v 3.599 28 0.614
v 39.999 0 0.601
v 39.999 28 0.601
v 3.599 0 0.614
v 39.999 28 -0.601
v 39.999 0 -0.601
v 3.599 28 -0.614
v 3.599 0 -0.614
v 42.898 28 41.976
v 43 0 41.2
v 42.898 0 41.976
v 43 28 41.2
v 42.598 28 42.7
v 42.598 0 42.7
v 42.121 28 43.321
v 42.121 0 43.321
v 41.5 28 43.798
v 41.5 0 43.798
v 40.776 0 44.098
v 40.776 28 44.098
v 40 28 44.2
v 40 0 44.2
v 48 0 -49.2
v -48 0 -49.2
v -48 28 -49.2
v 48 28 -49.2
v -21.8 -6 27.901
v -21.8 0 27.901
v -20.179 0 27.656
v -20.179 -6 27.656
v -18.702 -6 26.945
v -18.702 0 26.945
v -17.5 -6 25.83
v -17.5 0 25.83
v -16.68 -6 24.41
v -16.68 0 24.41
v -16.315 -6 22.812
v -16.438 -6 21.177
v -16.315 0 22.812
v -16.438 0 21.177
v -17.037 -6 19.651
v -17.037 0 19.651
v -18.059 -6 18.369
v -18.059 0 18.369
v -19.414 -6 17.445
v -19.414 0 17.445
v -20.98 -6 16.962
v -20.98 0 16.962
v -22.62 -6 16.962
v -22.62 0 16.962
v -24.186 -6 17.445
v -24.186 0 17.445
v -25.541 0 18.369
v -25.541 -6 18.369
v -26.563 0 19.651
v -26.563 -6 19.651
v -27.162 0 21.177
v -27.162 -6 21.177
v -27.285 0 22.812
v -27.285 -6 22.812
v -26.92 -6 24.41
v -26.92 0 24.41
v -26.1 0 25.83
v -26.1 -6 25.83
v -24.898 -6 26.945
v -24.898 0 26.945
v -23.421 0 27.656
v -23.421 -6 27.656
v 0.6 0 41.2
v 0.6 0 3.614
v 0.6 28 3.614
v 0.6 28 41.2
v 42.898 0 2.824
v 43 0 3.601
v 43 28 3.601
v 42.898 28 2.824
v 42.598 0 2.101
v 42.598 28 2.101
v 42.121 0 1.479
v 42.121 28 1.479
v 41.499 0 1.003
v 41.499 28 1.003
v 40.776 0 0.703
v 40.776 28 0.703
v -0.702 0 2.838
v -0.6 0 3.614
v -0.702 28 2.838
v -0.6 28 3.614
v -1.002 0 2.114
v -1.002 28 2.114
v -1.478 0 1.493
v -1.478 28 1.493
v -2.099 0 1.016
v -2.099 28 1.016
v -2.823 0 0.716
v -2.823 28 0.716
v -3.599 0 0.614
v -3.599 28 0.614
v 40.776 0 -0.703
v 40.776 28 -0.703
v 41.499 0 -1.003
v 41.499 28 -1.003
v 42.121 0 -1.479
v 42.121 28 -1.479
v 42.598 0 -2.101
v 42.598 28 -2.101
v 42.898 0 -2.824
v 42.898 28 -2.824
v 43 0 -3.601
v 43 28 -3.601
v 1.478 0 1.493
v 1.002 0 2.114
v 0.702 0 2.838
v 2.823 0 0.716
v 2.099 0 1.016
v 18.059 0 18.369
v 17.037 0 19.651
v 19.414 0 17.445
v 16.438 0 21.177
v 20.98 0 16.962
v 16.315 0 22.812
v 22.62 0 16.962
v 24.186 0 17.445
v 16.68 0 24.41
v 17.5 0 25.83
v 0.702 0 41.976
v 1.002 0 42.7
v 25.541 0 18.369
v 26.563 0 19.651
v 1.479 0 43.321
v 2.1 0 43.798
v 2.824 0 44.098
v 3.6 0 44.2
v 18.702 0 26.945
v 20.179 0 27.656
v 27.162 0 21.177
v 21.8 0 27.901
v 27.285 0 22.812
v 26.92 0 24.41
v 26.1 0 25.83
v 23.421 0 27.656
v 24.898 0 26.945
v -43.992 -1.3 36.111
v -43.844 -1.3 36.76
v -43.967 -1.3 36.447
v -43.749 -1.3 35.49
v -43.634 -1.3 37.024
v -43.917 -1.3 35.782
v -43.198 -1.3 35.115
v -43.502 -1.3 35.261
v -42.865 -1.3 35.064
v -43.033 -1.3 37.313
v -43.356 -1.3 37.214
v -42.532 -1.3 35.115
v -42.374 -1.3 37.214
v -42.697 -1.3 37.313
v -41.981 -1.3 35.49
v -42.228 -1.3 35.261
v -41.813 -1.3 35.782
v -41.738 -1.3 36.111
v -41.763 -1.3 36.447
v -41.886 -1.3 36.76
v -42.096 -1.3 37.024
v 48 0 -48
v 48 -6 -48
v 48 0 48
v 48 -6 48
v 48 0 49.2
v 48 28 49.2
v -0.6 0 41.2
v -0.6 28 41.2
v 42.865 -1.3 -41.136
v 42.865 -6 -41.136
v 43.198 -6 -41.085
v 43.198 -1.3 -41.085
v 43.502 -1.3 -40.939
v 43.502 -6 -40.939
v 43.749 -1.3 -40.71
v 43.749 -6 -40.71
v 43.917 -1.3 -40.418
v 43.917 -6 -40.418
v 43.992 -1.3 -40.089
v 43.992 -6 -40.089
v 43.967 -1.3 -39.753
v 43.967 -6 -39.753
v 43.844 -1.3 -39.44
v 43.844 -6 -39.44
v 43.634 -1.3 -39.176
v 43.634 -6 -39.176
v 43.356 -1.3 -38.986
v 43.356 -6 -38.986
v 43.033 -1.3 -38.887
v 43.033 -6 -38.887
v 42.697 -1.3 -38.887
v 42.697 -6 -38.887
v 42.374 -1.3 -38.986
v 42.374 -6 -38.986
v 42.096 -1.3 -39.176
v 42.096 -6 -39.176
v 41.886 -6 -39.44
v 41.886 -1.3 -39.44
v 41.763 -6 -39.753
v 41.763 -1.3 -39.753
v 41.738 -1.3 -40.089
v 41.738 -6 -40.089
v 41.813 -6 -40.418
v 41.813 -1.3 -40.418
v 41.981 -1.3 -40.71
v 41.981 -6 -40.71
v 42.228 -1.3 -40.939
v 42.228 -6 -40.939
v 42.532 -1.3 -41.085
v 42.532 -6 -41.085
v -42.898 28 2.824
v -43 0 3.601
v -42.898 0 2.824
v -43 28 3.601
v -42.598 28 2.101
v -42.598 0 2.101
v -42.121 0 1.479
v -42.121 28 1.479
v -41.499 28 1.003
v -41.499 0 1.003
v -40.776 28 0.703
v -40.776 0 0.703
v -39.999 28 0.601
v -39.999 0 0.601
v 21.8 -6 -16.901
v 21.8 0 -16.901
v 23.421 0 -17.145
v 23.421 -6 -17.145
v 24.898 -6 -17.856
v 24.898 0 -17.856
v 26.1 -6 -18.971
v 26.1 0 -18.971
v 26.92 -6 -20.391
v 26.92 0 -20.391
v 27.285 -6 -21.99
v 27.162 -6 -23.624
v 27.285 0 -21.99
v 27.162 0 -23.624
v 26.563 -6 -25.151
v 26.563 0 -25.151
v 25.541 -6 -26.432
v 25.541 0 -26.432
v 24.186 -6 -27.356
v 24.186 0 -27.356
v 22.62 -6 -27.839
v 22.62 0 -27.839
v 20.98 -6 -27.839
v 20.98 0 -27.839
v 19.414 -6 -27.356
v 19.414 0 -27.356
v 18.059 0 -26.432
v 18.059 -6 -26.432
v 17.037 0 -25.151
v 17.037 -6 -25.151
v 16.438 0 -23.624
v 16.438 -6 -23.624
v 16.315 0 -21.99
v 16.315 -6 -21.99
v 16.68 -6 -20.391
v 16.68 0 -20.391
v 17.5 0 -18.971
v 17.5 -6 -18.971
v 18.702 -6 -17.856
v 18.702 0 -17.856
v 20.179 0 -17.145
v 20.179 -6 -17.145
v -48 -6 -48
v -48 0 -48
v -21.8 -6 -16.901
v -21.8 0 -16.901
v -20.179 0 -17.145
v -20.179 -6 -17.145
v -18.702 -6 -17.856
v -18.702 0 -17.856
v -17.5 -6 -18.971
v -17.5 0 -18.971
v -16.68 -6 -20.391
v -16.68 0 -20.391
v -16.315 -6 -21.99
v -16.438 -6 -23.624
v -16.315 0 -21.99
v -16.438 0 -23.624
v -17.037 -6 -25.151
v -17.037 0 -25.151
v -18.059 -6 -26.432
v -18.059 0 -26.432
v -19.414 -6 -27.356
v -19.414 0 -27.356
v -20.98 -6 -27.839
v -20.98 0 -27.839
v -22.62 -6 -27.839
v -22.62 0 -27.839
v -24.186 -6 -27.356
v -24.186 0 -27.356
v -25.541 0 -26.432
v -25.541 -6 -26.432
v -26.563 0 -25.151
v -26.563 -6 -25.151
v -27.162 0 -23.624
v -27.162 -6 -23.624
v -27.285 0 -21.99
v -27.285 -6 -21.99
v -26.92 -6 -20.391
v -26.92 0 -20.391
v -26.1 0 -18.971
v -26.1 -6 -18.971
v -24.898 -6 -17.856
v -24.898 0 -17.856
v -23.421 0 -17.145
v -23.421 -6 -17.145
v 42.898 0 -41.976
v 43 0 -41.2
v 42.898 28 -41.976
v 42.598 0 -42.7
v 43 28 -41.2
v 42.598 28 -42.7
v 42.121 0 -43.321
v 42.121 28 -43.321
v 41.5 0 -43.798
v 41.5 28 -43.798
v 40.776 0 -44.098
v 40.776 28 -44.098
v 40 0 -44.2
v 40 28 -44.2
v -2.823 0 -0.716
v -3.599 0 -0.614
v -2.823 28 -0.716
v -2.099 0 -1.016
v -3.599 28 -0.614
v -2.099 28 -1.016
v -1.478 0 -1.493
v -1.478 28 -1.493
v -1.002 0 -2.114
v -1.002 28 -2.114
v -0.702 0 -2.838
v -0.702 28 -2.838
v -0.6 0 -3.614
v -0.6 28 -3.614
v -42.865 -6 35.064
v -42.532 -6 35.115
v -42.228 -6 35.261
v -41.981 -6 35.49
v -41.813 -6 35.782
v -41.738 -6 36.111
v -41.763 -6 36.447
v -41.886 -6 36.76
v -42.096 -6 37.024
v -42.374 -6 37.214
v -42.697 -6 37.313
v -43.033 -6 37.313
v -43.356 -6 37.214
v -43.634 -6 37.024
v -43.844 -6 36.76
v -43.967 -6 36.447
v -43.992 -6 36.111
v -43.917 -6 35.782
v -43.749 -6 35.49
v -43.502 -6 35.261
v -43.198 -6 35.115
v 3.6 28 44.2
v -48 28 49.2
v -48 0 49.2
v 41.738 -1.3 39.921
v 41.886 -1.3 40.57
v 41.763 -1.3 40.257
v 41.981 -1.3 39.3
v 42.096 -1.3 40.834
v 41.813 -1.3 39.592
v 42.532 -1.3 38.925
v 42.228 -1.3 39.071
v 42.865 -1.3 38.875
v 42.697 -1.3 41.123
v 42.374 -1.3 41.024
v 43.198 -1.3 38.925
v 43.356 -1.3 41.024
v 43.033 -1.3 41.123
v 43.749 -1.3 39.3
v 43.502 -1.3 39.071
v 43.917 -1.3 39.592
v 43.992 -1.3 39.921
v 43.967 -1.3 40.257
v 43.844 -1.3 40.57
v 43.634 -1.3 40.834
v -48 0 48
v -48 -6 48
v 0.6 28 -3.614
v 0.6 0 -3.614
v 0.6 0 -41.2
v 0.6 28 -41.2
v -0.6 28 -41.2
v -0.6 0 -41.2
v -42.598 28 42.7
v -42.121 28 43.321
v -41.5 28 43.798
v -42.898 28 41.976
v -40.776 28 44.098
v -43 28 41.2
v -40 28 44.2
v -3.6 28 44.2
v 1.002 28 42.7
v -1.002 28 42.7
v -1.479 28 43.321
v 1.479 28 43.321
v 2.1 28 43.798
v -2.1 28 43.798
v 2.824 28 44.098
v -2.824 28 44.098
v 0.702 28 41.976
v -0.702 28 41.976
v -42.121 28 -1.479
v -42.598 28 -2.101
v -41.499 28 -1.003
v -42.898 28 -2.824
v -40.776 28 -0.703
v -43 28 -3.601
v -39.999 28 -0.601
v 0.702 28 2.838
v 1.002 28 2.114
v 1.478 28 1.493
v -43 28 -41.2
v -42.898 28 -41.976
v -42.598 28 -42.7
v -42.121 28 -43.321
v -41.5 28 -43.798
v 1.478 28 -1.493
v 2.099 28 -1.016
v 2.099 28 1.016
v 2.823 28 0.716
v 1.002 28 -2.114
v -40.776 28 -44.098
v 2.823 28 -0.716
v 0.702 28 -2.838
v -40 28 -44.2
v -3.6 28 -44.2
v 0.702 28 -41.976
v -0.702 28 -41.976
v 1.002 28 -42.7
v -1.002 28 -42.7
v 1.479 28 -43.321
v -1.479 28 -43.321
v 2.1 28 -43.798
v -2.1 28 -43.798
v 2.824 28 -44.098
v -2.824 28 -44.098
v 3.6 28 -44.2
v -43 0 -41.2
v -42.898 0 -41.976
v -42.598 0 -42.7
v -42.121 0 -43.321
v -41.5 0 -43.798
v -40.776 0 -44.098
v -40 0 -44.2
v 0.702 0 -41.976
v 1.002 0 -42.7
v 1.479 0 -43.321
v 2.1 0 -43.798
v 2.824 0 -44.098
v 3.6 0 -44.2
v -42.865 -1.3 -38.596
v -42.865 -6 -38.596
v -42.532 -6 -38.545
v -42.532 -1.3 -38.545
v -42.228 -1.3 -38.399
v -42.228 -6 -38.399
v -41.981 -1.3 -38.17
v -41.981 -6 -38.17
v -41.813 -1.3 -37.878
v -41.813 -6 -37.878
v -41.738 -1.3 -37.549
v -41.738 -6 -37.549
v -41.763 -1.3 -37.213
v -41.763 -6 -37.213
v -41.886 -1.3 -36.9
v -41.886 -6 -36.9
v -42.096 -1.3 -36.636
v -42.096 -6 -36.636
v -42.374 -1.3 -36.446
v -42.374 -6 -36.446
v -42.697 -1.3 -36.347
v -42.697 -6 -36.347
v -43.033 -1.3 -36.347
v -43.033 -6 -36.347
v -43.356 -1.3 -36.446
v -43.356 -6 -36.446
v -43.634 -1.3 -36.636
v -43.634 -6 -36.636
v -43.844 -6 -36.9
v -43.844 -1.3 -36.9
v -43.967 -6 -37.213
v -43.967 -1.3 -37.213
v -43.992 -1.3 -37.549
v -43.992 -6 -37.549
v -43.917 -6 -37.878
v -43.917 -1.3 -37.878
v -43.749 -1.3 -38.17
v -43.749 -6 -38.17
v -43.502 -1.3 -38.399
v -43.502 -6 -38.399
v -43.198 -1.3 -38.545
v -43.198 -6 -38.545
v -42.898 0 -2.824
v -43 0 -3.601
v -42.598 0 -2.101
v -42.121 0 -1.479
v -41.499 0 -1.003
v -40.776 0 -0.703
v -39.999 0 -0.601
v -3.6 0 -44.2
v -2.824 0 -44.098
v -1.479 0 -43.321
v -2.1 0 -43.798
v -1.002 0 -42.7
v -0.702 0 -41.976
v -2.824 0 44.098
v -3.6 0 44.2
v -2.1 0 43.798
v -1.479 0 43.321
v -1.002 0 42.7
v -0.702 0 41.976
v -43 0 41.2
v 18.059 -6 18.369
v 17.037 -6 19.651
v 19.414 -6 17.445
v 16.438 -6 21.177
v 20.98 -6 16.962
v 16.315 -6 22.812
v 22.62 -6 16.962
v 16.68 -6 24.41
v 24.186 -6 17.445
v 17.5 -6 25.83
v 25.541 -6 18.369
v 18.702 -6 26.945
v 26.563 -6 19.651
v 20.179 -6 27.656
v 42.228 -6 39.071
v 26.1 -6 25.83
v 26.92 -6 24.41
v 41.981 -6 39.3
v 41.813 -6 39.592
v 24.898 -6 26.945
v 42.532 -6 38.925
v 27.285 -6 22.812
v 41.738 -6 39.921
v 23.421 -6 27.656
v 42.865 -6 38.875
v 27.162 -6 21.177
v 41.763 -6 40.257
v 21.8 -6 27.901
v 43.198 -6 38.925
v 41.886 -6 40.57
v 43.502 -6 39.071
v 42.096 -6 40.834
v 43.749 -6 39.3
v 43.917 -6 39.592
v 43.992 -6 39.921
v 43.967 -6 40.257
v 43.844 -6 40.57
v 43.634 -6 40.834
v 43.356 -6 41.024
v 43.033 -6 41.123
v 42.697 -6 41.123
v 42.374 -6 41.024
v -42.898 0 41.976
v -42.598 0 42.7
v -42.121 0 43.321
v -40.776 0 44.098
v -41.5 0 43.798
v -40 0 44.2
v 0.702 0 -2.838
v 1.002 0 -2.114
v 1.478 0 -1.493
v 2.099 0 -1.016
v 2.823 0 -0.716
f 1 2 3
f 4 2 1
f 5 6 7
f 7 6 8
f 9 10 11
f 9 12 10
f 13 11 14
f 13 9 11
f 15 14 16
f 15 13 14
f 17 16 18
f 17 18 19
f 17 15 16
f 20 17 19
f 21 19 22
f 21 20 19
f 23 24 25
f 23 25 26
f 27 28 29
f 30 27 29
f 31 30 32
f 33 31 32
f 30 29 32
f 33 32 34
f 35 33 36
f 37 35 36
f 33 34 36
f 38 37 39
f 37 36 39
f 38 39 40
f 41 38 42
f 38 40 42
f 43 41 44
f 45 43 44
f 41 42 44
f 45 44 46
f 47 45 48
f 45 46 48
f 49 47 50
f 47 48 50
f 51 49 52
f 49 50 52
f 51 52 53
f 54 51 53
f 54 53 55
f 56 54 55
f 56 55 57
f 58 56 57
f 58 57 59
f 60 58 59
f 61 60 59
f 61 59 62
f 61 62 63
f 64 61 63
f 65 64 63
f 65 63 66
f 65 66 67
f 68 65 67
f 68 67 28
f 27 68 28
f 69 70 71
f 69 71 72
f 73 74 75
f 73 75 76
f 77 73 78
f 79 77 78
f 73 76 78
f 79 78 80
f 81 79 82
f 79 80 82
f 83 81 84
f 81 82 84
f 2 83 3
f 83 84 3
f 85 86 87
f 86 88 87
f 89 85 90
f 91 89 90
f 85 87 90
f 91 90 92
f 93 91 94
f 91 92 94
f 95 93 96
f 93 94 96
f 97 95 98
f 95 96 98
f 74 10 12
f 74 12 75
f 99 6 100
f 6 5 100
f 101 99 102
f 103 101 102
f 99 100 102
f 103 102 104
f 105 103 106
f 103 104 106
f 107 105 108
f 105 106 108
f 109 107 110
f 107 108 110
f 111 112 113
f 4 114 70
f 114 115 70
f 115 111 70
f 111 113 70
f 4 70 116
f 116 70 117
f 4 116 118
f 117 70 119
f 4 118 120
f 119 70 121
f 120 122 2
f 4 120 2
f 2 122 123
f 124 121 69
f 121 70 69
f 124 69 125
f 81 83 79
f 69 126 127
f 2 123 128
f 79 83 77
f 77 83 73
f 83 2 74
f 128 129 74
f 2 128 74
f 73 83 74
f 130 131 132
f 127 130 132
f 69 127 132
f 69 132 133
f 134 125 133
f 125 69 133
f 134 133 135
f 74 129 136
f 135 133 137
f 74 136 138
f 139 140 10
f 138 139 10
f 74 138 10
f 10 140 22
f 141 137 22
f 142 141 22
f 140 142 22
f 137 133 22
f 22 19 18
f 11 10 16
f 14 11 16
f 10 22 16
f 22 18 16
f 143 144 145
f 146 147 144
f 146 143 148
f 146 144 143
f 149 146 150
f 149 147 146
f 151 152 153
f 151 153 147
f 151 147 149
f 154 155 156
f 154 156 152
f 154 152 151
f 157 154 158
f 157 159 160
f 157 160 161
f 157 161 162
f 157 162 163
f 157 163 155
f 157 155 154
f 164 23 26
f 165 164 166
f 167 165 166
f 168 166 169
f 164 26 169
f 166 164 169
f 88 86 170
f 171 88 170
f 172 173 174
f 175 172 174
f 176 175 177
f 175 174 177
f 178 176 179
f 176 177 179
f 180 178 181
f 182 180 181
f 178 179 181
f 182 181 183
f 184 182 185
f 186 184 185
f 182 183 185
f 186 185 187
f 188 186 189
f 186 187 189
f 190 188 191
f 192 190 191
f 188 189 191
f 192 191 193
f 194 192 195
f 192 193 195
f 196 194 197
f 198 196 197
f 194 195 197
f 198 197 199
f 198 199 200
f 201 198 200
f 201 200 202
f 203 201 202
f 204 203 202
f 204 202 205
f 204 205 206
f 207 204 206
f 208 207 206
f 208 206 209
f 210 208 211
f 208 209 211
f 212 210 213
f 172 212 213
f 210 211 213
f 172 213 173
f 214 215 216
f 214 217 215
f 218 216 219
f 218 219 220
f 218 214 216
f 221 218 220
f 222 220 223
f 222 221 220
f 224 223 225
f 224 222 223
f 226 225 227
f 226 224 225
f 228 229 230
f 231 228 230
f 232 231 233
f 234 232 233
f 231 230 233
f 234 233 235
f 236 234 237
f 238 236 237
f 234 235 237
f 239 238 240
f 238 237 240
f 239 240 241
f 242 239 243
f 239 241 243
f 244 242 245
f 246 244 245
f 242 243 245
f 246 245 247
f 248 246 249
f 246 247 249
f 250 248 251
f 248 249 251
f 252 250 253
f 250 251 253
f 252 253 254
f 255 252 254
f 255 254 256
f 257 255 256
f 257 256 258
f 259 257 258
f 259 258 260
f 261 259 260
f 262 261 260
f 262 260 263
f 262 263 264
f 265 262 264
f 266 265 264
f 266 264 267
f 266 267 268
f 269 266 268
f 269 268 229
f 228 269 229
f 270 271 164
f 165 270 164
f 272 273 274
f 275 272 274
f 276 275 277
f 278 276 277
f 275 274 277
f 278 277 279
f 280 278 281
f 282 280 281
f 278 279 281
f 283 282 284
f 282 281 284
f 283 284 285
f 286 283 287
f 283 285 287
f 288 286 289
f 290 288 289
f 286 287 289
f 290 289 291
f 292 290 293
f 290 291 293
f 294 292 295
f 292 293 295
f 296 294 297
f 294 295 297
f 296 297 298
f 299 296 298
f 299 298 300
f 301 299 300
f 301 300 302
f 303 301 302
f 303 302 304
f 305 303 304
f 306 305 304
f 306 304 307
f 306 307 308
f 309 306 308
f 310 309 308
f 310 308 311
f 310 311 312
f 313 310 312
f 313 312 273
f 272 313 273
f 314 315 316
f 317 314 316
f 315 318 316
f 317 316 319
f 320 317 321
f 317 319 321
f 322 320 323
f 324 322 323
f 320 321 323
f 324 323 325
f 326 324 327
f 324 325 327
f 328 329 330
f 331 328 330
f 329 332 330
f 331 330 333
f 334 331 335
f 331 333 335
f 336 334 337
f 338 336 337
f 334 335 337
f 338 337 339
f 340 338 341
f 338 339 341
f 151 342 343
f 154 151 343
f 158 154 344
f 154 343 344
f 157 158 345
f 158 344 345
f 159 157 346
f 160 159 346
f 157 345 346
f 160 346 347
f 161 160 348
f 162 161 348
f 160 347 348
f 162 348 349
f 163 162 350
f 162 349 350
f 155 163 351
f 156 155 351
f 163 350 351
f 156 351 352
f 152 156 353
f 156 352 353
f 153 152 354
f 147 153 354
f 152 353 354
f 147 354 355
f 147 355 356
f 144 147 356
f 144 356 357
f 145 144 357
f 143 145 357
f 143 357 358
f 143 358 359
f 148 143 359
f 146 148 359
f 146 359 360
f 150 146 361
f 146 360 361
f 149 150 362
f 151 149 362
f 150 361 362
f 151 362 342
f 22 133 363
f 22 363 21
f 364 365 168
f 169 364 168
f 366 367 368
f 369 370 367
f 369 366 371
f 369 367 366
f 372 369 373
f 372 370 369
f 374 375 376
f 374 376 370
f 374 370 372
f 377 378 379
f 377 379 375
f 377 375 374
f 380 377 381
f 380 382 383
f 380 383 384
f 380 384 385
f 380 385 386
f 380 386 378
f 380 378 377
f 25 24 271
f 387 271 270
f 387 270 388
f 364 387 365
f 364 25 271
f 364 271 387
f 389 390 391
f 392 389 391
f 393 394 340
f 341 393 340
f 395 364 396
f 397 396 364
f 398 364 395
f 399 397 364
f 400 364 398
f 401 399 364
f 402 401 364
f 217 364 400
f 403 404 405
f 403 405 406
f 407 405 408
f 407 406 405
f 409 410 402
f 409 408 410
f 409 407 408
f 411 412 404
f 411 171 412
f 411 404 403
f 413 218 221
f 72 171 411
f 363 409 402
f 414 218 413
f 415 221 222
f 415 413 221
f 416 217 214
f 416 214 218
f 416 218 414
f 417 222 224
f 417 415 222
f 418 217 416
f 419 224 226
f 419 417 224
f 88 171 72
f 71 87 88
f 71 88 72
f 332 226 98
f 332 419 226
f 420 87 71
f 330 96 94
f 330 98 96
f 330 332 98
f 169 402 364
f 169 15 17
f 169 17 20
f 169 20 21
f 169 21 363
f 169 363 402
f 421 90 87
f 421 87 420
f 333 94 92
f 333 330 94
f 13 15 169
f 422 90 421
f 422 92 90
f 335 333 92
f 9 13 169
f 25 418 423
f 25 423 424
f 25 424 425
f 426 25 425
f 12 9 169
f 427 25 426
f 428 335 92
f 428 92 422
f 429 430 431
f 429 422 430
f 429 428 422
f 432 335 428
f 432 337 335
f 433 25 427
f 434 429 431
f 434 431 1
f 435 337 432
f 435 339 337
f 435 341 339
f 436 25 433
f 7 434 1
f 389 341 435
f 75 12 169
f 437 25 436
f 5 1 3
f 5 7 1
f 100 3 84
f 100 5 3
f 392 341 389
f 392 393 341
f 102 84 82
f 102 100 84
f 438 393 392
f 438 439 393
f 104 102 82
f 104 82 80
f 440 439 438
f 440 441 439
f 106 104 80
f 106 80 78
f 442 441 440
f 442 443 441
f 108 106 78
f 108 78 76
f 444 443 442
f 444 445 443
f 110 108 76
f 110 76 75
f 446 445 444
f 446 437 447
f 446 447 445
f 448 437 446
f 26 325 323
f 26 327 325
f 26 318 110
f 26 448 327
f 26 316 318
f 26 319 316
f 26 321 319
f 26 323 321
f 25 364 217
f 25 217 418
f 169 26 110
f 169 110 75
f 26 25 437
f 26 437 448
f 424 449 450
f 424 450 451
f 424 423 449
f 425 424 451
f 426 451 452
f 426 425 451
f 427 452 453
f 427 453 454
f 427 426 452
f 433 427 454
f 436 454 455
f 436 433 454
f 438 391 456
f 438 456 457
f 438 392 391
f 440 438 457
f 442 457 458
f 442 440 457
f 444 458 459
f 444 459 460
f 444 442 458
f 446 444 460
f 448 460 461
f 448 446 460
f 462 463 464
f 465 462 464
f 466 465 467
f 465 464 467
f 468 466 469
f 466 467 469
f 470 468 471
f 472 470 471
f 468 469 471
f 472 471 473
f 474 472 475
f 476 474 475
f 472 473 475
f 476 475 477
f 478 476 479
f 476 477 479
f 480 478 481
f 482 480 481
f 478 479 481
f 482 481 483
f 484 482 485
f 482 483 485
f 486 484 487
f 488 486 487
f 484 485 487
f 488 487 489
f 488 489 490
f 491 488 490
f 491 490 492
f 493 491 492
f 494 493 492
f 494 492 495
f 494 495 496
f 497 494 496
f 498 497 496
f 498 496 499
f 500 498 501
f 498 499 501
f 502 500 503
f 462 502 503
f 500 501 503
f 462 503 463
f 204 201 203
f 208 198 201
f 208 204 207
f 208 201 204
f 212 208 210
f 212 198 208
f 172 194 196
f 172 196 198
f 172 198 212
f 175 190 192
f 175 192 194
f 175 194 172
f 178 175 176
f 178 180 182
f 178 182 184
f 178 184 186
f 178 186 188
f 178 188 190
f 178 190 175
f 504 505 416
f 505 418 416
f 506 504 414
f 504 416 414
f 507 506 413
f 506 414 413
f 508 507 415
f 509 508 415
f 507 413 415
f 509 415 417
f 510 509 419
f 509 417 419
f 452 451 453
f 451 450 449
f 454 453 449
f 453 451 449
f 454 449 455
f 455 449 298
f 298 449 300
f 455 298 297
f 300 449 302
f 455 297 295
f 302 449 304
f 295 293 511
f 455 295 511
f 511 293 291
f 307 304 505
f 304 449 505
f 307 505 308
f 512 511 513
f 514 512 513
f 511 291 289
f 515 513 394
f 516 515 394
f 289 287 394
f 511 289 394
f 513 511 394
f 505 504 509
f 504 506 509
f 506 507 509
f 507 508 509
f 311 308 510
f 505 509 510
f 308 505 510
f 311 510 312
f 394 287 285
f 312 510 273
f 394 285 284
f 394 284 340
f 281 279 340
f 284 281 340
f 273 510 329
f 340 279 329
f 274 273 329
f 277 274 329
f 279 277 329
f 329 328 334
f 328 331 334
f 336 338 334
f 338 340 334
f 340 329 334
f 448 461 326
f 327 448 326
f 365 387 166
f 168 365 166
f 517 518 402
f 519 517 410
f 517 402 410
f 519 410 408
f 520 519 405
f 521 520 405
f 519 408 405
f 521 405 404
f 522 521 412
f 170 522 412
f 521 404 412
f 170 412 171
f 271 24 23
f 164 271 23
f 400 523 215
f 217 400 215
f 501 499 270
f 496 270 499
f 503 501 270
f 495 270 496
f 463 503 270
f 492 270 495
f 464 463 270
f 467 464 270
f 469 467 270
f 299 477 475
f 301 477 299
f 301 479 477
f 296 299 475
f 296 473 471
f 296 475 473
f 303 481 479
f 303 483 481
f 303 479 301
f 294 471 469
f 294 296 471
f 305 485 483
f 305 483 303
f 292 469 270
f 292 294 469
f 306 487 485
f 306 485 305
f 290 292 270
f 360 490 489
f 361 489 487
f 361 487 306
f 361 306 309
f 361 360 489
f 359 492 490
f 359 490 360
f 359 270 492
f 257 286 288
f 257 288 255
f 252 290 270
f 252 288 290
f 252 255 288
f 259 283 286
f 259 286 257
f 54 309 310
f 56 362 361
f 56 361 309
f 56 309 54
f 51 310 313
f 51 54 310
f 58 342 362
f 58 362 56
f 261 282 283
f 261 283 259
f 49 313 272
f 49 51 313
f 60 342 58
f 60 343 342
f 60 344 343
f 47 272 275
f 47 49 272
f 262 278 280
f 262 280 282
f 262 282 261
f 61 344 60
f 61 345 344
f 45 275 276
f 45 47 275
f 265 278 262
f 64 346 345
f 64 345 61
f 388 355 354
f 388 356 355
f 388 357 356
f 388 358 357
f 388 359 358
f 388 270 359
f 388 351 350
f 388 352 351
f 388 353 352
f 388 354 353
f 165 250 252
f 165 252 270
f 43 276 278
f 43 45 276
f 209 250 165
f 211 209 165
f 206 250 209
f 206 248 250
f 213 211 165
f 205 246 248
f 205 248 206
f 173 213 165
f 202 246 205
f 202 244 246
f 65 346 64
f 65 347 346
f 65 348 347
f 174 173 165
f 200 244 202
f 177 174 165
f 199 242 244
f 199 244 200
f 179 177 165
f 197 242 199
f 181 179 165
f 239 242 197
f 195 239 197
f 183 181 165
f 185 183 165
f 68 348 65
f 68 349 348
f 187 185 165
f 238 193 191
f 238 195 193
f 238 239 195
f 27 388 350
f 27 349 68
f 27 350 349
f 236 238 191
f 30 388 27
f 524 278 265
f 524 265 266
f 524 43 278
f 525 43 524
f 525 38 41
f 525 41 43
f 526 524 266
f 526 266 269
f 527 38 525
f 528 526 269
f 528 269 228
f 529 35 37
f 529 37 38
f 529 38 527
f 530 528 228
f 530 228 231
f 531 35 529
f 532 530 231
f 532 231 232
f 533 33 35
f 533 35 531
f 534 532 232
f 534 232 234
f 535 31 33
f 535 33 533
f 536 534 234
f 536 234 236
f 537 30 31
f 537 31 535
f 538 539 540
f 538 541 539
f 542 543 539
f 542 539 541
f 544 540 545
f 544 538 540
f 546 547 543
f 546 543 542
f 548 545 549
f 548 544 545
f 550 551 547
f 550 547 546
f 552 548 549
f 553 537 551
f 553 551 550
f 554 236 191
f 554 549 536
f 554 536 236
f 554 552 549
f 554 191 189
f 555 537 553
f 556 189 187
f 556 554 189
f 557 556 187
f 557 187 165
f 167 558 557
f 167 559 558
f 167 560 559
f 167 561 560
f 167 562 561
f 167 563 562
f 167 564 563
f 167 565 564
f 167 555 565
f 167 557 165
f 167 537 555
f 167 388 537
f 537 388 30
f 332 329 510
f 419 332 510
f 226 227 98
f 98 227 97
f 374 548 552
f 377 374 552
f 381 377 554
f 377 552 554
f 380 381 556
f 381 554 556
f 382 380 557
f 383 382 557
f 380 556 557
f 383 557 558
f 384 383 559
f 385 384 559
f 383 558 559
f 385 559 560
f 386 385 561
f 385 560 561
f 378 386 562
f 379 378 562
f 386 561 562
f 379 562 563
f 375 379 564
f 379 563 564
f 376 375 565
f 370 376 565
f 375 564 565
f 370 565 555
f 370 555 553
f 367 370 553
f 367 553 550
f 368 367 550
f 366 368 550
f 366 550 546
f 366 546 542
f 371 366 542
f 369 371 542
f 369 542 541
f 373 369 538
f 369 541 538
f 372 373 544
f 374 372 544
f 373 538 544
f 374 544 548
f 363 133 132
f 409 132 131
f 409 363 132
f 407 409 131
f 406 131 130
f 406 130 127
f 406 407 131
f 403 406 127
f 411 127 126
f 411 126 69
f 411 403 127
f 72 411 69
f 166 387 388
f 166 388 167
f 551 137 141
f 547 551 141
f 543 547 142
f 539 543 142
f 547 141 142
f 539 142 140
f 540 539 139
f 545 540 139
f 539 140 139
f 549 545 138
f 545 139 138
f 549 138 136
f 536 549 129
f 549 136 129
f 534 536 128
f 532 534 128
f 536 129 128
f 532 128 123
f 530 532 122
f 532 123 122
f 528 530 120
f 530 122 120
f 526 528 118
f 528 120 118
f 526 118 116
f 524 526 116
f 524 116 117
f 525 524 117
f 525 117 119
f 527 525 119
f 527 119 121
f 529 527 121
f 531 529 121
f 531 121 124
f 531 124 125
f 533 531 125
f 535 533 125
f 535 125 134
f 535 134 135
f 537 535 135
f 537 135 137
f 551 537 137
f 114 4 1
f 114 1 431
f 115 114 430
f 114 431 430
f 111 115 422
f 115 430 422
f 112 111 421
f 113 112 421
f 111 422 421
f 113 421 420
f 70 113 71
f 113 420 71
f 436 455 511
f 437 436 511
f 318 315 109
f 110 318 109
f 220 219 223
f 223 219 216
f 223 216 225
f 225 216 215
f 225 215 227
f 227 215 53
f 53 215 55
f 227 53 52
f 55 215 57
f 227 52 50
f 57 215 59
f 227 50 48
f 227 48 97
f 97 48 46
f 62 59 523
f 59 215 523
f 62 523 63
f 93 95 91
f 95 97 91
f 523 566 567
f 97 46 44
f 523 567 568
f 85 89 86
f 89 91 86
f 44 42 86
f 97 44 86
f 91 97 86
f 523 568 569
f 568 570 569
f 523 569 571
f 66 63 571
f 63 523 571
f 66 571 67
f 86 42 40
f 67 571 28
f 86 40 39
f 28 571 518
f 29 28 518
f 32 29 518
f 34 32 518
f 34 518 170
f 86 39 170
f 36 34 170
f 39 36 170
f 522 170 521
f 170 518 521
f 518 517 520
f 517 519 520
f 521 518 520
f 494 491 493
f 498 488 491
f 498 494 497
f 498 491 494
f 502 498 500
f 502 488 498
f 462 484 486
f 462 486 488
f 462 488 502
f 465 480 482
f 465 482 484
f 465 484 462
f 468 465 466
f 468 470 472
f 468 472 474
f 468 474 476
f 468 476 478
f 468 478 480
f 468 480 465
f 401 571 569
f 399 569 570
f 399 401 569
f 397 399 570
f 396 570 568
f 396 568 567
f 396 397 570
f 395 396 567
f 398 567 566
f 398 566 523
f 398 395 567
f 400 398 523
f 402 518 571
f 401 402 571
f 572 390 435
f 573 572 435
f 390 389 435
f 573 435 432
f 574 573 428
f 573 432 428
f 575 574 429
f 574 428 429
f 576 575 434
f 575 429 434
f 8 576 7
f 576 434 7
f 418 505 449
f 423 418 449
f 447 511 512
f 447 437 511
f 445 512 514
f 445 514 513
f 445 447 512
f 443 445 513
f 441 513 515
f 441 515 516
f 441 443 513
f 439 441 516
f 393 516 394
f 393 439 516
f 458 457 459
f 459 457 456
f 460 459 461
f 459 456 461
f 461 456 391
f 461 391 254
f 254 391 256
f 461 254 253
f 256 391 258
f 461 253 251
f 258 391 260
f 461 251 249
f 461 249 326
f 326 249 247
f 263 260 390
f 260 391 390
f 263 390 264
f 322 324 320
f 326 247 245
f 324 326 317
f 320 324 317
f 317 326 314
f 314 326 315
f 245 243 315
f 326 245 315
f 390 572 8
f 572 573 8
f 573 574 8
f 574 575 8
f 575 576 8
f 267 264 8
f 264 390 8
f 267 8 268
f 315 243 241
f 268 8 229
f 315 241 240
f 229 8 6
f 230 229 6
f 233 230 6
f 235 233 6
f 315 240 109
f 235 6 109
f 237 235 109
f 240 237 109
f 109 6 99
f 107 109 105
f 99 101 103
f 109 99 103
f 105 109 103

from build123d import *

# Parameters (mm, degrees)
SKETCH1_W           = 96
SKETCH1_H           = 98.4
BOSS_EXTRUDE1_DEPTH = 28
FILLET1_R           = 3
SKETCH2_W           = 96
SKETCH2_H           = 96
BOSS_EXTRUDE2_DEPTH = 6
SKETCH4_R           = 1.1305
CUT_EXTRUDE2_DEPTH  = 4.7
SKETCH6_R           = 5.5
CUT_EXTRUDE3_DEPTH  = 75.22021288


with BuildPart() as part:
    # Sketch1 → Boss-Extrude1 (new body)
    with BuildSketch(Plane(origin=(0, 0, 0), x_dir=(1, 0, 0), z_dir=(0, 1, 0))):
        Rectangle(SKETCH1_W, SKETCH1_H)
        Polygon((-43, -44.2), (-43, -0.6), (-0.6, -0.615), (-0.6, -44.2), align=None, mode=Mode.SUBTRACT)
        Polygon((-43, 44.2), (-0.6, 44.2), (-0.6, 0.615), (-43, 0.6), align=None, mode=Mode.SUBTRACT)
        Polygon((43, -44.2), (43, -0.6), (0.6, -0.615), (0.6, -44.2), align=None, mode=Mode.SUBTRACT)
        Polygon((0.6, 44.2), (43, 44.2), (43, 0.6), (0.6, 0.615), align=None, mode=Mode.SUBTRACT)
    extrude(amount=BOSS_EXTRUDE1_DEPTH)

    # Fillet1
    fillet1_edges = [part.edges().sort_by_distance(p)[0] for p in [
        (-43, 14, 44.2),
        (-0.6, 14, 44.2),
        (-0.6, 14, 0.615),
        (-43, 14, 0.6),
        (-43, 14, -44.2),
        (-43, 14, -0.6),
        (-0.6, 14, -0.615),
        (-0.6, 14, -44.2),
        (43, 14, -0.6),
        (43, 14, -44.2),
        (0.6, 14, -44.2),
        (0.6, 14, -0.615),
        (0.6, 14, 44.2),
        (43, 14, 44.2),
        (43, 14, 0.6),
        (0.6, 14, 0.615),
    ]]
    fillet(fillet1_edges, radius=FILLET1_R)

    # Sketch2 → Boss-Extrude2 (add)
    with BuildSketch(Plane.XZ):
        Rectangle(SKETCH2_W, SKETCH2_H)
    extrude(amount=BOSS_EXTRUDE2_DEPTH)

    # Sketch4 → Cut-Extrude2 (cut)
    with BuildSketch(Plane.XZ.offset(6)):
        with Locations(Location((42.865, -40.005, 0), (0, 0, 270))):
            Circle(SKETCH4_R)
        with Locations(Location((-42.865, -37.465, 0), (0, 0, 270))):
            Circle(SKETCH4_R)
        with Locations(Location((42.865, 40.005, 0), (0, 0, 270))):
            Circle(SKETCH4_R)
        with Locations(Location((-42.865, 36.195, 0), (0, 0, 270))):
            Circle(SKETCH4_R)
    extrude(amount=-CUT_EXTRUDE2_DEPTH, mode=Mode.SUBTRACT)

    # Sketch6 → Cut-Extrude3 (cut, through all)
    with BuildSketch(Plane(origin=(0, 0, 0), x_dir=(1, 0, 0), z_dir=(0, 1, 0))):
        with Locations(Location((-21.8, 22.400530754, 0), (0, 0, 270))):
            Circle(SKETCH6_R)
        with Locations(Location((21.8, 22.400530754, 0), (0, 0, 270))):
            Circle(SKETCH6_R)
        with Locations(Location((21.8, -22.400530754, 0), (0, 0, 270))):
            Circle(SKETCH6_R)
        with Locations(Location((-21.8, -22.400530754, 0), (0, 0, 270))):
            Circle(SKETCH6_R)
    extrude(amount=-CUT_EXTRUDE3_DEPTH, mode=Mode.SUBTRACT)


solid = part.part
